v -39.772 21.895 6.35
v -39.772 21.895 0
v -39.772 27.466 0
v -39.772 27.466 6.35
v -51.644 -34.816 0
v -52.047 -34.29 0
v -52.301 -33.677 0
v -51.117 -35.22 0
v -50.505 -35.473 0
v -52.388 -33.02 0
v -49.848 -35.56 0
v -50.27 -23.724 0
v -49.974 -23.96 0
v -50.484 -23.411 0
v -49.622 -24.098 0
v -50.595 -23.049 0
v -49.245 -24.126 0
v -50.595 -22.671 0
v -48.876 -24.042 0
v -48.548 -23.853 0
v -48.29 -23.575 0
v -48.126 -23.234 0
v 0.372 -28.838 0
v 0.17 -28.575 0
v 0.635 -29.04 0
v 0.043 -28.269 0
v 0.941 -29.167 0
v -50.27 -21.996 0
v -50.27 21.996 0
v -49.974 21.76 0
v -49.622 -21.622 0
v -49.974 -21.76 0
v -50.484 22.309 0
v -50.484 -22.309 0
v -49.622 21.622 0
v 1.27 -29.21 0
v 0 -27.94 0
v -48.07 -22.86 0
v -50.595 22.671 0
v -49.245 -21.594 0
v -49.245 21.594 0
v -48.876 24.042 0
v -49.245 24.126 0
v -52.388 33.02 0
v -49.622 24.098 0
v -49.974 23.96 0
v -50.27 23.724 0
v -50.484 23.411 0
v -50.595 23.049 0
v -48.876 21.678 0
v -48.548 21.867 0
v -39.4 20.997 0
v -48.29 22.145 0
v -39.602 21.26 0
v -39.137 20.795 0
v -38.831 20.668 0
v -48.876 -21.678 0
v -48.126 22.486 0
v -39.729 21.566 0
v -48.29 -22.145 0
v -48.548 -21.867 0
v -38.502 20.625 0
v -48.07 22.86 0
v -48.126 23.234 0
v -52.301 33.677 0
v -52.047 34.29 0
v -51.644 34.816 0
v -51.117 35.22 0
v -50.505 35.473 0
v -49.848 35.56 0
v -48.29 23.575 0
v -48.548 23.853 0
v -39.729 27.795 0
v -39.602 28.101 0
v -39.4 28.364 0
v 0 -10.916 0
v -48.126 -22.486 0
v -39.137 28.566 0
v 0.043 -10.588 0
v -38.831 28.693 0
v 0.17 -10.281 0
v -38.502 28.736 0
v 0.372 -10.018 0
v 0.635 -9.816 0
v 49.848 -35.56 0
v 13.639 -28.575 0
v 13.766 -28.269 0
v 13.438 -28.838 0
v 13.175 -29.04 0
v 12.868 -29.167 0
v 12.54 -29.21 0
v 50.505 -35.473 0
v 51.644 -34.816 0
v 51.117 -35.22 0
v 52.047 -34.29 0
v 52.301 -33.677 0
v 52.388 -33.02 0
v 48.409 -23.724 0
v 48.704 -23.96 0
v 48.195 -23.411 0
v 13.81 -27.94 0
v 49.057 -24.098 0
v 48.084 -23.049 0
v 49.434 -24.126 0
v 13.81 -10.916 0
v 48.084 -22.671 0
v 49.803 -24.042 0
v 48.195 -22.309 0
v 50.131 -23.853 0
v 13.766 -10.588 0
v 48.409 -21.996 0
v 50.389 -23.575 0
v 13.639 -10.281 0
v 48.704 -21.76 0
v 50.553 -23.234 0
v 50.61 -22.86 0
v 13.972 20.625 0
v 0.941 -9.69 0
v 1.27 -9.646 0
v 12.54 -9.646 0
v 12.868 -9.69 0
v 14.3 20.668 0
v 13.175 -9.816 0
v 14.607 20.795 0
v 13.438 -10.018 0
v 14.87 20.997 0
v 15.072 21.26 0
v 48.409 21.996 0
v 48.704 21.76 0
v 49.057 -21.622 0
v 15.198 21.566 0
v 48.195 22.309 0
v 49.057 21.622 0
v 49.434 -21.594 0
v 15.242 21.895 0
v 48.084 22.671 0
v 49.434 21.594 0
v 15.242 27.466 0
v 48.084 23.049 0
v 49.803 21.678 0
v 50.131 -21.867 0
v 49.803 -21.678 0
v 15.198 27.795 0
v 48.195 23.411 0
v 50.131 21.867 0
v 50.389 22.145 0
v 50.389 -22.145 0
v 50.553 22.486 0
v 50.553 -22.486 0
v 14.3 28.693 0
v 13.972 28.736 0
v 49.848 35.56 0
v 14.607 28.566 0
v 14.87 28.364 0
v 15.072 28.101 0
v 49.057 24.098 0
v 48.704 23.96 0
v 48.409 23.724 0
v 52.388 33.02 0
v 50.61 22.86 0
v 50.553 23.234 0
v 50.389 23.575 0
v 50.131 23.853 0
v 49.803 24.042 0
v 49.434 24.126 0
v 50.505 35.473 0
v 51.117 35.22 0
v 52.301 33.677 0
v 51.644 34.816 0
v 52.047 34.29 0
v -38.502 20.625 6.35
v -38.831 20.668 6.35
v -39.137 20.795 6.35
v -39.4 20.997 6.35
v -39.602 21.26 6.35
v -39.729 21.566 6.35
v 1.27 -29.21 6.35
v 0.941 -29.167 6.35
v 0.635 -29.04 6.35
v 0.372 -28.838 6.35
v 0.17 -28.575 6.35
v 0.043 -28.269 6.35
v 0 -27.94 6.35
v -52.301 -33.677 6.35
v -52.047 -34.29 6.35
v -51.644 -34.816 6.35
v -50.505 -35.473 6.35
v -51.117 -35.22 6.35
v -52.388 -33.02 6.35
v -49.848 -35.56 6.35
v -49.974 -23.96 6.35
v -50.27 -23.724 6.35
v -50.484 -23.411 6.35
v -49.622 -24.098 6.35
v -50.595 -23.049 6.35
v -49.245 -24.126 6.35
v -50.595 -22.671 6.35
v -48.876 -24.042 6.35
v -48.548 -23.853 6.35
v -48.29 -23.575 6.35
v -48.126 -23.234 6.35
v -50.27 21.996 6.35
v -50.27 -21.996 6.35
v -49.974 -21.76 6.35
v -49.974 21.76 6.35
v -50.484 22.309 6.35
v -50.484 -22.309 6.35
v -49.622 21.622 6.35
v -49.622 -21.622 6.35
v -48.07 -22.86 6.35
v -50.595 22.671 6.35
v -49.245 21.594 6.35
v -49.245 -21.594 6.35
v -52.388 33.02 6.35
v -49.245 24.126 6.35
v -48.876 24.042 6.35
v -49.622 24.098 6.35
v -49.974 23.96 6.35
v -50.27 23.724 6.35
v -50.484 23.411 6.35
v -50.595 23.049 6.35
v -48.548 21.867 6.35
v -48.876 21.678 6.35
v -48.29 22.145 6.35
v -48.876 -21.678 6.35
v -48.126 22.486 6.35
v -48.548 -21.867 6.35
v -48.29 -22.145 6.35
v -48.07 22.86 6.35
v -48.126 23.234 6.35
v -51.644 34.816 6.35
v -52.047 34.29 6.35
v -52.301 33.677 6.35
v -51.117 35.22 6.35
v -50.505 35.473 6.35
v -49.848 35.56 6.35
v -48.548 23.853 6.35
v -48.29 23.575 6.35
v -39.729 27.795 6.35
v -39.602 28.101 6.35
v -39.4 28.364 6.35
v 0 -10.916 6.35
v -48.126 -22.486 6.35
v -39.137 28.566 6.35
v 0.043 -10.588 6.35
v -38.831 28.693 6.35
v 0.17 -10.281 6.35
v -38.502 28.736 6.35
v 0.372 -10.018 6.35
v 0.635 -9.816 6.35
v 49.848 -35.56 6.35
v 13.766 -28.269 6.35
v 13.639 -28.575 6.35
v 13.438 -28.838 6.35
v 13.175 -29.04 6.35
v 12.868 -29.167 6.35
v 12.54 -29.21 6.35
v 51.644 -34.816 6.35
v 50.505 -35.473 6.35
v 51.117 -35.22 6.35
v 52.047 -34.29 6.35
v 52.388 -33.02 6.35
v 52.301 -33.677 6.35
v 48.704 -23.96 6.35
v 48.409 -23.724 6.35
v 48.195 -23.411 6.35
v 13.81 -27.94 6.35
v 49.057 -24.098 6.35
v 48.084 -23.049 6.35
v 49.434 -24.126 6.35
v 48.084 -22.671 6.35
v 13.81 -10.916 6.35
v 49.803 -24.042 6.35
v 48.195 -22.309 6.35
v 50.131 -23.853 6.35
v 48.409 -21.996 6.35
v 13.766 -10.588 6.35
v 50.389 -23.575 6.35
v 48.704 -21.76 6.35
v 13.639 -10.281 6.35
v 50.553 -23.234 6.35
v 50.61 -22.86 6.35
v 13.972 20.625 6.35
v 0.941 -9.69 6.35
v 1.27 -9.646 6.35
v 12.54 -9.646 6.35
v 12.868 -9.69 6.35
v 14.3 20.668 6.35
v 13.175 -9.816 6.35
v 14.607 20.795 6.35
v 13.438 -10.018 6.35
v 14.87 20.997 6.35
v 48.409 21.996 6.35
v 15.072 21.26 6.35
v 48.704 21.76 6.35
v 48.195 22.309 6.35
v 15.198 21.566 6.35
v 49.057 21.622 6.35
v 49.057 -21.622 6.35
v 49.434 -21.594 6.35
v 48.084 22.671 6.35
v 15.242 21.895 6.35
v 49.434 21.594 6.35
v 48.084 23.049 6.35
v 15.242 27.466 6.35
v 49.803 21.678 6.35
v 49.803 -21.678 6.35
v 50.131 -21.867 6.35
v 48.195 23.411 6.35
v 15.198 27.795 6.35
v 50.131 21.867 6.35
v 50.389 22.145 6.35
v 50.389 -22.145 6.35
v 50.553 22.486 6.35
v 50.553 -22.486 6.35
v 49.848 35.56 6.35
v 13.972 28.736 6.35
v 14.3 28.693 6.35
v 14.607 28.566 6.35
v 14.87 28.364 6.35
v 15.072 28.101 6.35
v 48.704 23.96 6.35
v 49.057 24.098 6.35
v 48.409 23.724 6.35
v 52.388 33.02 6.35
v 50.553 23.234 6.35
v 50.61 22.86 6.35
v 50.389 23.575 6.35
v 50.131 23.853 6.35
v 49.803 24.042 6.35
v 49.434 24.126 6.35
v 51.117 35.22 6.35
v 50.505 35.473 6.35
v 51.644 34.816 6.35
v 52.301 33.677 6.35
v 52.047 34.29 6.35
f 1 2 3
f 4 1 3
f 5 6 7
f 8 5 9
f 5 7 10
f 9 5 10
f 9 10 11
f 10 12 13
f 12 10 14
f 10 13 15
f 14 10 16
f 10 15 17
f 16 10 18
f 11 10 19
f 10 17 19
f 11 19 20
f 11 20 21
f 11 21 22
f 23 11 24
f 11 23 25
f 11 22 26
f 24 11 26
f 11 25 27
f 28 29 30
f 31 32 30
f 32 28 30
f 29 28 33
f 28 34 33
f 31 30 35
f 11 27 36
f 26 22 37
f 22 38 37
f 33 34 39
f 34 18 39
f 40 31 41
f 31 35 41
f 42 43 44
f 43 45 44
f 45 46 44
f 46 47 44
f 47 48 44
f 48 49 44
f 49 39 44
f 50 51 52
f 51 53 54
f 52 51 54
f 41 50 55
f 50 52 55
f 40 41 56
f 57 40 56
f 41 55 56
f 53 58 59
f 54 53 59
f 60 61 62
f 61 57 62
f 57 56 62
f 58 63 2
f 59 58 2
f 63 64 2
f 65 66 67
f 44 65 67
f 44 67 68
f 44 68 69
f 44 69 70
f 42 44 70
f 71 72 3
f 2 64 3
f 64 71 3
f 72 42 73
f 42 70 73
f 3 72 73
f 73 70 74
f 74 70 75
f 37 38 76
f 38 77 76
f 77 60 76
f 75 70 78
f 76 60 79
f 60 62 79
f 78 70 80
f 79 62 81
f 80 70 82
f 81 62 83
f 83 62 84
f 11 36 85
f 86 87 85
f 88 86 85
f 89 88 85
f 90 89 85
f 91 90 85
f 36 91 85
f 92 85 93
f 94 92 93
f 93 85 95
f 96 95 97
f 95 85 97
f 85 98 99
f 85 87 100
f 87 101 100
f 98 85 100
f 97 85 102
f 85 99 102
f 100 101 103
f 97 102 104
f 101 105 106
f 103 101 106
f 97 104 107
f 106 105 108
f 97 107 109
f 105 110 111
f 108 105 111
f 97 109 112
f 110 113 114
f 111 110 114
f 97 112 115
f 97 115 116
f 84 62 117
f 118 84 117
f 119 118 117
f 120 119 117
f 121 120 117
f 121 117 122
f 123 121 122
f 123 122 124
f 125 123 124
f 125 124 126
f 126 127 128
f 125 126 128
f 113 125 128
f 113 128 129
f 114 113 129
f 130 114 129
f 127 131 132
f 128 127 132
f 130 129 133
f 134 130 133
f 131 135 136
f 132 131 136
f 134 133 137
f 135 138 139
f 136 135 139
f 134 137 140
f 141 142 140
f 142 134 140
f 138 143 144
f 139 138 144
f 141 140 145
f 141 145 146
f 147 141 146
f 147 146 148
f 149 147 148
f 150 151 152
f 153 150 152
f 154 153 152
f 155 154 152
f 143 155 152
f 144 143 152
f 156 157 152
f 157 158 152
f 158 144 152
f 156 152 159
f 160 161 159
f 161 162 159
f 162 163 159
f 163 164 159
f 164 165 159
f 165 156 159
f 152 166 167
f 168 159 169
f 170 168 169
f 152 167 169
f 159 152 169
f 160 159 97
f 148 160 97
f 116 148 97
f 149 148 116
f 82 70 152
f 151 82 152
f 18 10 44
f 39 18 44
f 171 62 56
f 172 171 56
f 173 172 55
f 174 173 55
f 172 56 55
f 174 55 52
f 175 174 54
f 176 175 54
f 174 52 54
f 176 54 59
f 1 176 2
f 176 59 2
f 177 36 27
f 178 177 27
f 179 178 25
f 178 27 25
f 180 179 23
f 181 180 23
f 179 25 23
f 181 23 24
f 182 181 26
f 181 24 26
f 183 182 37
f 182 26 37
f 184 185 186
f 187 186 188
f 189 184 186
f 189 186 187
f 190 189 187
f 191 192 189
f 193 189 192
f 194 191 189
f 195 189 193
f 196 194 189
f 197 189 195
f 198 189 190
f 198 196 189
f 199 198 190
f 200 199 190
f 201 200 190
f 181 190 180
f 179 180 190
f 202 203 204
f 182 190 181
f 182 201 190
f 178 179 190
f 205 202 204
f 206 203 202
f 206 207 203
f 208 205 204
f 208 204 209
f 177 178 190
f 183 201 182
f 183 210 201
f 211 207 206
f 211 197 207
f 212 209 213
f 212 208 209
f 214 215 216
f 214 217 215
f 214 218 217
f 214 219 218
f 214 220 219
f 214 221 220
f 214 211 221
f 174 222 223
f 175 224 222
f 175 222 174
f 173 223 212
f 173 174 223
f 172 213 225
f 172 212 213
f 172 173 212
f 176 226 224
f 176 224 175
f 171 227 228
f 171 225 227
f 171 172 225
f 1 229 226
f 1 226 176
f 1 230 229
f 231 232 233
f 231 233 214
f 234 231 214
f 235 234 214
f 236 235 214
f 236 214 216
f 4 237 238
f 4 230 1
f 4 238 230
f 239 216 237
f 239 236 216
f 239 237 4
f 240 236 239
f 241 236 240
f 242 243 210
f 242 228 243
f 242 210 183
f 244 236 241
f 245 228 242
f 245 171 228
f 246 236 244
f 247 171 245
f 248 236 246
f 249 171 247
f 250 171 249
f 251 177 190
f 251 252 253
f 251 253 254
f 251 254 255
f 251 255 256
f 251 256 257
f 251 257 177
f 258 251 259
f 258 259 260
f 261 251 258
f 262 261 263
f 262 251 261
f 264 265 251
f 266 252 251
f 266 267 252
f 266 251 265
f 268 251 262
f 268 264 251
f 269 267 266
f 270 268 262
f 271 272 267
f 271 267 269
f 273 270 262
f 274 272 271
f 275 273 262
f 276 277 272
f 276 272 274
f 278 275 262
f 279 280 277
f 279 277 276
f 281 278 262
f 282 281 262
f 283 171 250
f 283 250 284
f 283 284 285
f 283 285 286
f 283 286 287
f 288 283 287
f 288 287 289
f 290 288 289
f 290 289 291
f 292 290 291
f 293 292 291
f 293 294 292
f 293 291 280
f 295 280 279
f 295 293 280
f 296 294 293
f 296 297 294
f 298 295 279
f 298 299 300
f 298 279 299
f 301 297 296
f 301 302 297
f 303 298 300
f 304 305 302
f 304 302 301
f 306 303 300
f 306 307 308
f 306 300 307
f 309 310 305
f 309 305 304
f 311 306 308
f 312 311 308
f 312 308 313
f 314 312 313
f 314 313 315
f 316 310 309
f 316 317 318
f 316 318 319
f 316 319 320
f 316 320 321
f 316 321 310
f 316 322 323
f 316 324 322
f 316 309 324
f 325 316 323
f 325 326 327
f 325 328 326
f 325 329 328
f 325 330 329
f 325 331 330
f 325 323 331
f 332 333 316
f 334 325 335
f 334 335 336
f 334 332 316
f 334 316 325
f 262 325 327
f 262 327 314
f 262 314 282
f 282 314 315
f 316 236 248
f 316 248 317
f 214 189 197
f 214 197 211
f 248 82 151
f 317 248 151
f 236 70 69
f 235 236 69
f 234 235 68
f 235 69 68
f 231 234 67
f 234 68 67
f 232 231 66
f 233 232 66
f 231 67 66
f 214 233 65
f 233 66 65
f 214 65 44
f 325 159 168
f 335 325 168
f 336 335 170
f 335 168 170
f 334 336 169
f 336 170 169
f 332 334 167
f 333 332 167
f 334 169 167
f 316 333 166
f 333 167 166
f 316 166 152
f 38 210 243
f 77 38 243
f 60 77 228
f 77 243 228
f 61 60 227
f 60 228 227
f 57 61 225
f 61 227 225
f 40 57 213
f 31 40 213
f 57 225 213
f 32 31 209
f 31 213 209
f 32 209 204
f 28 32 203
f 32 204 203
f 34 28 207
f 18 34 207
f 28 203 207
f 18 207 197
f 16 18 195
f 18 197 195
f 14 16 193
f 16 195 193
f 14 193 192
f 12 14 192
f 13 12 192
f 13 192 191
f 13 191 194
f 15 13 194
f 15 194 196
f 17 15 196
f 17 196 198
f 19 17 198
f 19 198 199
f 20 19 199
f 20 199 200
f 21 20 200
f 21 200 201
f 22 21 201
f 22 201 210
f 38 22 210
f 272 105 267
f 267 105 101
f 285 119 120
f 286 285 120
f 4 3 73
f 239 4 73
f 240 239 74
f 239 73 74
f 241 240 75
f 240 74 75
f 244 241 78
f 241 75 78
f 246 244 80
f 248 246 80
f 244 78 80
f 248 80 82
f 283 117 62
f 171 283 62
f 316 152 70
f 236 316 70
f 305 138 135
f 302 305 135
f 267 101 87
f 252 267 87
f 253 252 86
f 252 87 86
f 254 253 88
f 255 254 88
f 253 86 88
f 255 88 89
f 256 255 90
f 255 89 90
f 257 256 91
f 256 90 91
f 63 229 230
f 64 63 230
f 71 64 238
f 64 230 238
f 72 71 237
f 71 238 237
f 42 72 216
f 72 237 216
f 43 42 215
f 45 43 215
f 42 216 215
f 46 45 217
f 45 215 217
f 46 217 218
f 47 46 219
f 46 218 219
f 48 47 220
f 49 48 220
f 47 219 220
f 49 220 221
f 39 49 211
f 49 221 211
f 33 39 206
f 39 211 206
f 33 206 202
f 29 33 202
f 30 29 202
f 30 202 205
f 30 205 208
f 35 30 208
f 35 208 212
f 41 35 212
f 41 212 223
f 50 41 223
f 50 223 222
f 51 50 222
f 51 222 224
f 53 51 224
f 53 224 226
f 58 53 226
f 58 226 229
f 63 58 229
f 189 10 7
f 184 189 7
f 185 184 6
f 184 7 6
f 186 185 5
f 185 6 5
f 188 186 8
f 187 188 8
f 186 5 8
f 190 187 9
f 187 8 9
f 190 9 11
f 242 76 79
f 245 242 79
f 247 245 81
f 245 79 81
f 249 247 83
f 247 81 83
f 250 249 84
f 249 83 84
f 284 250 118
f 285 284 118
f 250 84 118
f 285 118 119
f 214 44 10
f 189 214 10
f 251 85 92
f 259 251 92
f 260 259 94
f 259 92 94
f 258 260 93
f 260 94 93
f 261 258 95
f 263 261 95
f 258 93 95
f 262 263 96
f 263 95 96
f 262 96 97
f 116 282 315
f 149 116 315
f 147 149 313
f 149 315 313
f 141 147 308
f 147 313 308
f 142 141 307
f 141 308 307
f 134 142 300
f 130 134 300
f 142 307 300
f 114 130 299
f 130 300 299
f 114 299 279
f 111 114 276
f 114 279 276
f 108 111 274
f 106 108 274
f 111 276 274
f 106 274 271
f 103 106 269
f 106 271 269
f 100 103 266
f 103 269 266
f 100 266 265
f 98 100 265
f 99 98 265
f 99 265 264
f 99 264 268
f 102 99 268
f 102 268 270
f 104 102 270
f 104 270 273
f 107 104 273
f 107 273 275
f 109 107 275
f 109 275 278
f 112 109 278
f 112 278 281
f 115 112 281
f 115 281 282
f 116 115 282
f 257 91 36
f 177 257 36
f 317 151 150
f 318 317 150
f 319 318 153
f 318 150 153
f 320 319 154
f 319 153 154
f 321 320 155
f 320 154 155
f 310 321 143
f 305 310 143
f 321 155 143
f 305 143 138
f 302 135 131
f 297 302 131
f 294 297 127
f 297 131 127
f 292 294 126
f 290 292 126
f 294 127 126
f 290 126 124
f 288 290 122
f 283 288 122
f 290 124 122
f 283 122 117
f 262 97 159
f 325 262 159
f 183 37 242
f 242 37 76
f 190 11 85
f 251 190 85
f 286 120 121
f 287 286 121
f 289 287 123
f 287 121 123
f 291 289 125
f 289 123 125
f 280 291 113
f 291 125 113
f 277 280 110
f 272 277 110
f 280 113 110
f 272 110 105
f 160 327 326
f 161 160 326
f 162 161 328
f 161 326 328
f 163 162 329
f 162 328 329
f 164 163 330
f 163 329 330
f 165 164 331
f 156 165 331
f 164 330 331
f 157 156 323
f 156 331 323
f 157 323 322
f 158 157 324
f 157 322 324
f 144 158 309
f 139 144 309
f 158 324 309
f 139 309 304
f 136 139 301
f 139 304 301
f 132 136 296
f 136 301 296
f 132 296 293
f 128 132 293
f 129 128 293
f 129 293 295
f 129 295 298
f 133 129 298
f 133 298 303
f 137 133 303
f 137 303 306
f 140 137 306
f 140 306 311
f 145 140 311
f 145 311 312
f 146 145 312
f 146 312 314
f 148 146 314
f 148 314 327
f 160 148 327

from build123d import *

# Parameters (mm, degrees)
BOSS_EXTRUDE1_DEPTH = 6.35
SKETCH2_R           = 1.27
CUT_EXTRUDE1_DEPTH  = 64.634002359


with BuildPart() as part:
    # Sketch1 → Boss-Extrude1 (new body)
    with BuildSketch(Plane.XY):
        with BuildLine():
            Line((52.3875, -33.02), (52.3875, 33.02))
            ThreePointArc((52.3875, 33.02), (51.643551224, 34.816051224), (49.8475, 35.56))
            Line((49.8475, 35.56), (-49.8475, 35.56))
            ThreePointArc((-49.8475, 35.56), (-51.643551224, 34.816051224), (-52.3875, 33.02))
            Line((-52.3875, 33.02), (-52.3875, -33.02))
            ThreePointArc((-52.3875, -33.02), (-51.643551224, -34.816051224), (-49.8475, -35.56))
            Line((-49.8475, -35.56), (49.8475, -35.56))
            ThreePointArc((49.8475, -35.56), (51.643551224, -34.816051224), (52.3875, -33.02))
        make_face()
        with BuildLine():
            Line((-38.502324621, 28.736218676), (13.971672014, 28.736218676))
            ThreePointArc((13.971672014, 28.736218676), (14.869697627, 28.364244288), (15.241672014, 27.466218676))
            Line((15.241672014, 27.466218676), (15.241672014, 21.89465856))
            ThreePointArc((15.241672014, 21.89465856), (14.869697627, 20.996632948), (13.971672014, 20.62465856))
            Line((13.971672014, 20.62465856), (-38.502324621, 20.62465856))
            ThreePointArc((-38.502324621, 20.62465856), (-39.400350233, 20.996632948), (-39.772324621, 21.89465856))
            Line((-39.772324621, 21.89465856), (-39.772324621, 27.466218676))
            ThreePointArc((-39.772324621, 27.466218676), (-39.400350233, 28.364244288), (-38.502324621, 28.736218676))
        make_face(mode=Mode.SUBTRACT)
        with BuildLine():
            Line((1.27, -9.646243467), (12.539518383, -9.646243467))
            ThreePointArc((12.539518383, -9.646243467), (13.437543995, -10.018217855), (13.809518383, -10.916243467))
            Line((13.809518383, -10.916243467), (13.809518383, -27.94))
            ThreePointArc((13.809518383, -27.94), (13.437543995, -28.838025612), (12.539518383, -29.21))
            Line((12.539518383, -29.21), (1.27, -29.21))
            ThreePointArc((1.27, -29.21), (0.371974388, -28.838025612), (0, -27.94))
            Line((0, -27.94), (0, -10.916243467))
            ThreePointArc((0, -10.916243467), (0.371974388, -10.018217855), (1.27, -9.646243467))
        make_face(mode=Mode.SUBTRACT)
    extrude(amount=BOSS_EXTRUDE1_DEPTH)

    # Sketch2 → Cut-Extrude1 (cut, through all)
    with BuildSketch(Plane.XY.offset(6.35)):
        with Locations((-49.3395, -22.86)):
            Circle(SKETCH2_R)
        with Locations((-49.3395, 22.86)):
            Circle(SKETCH2_R)
        with Locations((49.3395, 22.86)):
            Circle(SKETCH2_R)
        with Locations((49.3395, -22.86)):
            Circle(SKETCH2_R)
    extrude(amount=-CUT_EXTRUDE1_DEPTH, mode=Mode.SUBTRACT)


solid = part.part
